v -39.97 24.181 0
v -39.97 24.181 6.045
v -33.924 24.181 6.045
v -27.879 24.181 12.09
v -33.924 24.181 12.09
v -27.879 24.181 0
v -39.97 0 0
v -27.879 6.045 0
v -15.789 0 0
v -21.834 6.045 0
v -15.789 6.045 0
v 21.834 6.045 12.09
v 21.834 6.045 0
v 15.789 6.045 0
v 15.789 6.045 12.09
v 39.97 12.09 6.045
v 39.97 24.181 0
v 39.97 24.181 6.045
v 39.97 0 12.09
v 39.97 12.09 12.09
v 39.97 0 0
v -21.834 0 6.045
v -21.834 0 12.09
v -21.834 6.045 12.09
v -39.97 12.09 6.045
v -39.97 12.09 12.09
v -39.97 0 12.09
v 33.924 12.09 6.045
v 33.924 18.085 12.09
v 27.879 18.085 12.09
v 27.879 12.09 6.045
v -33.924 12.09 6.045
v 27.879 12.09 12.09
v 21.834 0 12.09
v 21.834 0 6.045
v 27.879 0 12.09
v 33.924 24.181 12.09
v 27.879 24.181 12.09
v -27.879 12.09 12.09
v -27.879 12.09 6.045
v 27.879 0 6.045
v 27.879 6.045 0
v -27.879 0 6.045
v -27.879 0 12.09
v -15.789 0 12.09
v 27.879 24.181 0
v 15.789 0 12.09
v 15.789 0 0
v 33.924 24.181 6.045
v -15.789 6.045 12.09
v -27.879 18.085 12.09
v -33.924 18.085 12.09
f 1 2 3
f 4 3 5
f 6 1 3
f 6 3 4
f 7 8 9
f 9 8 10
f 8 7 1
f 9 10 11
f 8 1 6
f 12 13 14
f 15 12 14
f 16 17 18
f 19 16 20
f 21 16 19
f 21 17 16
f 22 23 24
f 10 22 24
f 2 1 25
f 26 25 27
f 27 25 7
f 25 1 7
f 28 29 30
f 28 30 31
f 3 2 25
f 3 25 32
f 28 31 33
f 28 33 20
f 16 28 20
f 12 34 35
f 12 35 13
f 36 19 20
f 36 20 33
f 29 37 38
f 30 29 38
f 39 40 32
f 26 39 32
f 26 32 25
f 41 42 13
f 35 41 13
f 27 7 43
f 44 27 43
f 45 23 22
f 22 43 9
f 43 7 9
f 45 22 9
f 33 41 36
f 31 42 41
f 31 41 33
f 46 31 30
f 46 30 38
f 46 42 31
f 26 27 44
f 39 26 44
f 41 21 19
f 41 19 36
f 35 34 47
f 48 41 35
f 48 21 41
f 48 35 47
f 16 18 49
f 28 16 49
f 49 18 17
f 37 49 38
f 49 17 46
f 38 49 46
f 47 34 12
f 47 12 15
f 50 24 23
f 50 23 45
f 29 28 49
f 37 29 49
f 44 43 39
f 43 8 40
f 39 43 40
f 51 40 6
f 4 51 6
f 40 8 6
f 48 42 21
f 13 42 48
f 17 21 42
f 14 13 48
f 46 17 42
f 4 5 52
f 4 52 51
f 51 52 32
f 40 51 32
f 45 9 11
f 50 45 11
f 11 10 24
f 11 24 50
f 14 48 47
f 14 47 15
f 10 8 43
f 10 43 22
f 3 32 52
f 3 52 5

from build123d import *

# Parameters (mm, degrees)
F1_DEPTH  = 12.0904
F2_DEPTH  = 6.0452
F0_W      = 6.0452
F0_H      = 6.0452
F3_DEPTH  = 12.0904
F4_DEPTH  = 12.0904
F5_DEPTH  = 6.0452
F6_SIZE   = 6.04519
F7_DEPTH  = 12.0904
F8_DEPTH  = 12.0904
F11_DEPTH = 6.0452


# Not quite as in the source:
# - a fillet or chamfer is up to 0.001 mm smaller than in the source, because OpenCascade refuses the exact size


with BuildPart() as f1:
    # F0 (on Top) → F1 (new body)
    with BuildSketch(Plane.XY):
        Polygon((-39.9695653213, 0), (-27.8791653213, 0), (-27.8791653213, 6.0452), (-27.8791653213, 12.0904), (-33.9243653213, 12.0904), (-39.9695653213, 12.0904), align=None)
    extrude(amount=F1_DEPTH)

    # F0 (on Top) → F2 (join)
    with BuildSketch(Plane.XY):
        Polygon((-39.9695653213, 24.1808), (-39.9695653213, 12.0904), (-33.9243653213, 12.0904), (-33.9243653213, 18.1356), (-33.9243653213, 24.1808), align=None)
    extrude(amount=F2_DEPTH)

    # F0 (on Top) → F3 (join)
    with BuildSketch(Plane.XY):
        with Locations((-30.9017653213, 21.1582)):
            Rectangle(F0_W, F0_H)
    extrude(amount=F3_DEPTH)



with BuildPart() as f4:
    # F0 (on Top) → F4 (new body)
    with BuildSketch(Plane.XY):
        with Locations((-18.8113653213, 3.0226)):
            Rectangle(F0_W, F0_H)
    extrude(amount=F4_DEPTH)


with BuildPart() as f1_1:
    add(f1.part)

    add(f4.part)  # F5 merges F4
    # F0 (on Top) → F5 (join)
    with BuildSketch(Plane.XY):
        with Locations((-24.8565653213, 3.0226)):
            Rectangle(F0_W, F0_H)
    extrude(amount=F5_DEPTH)

    # F6 (size 6.0452 in the source; OpenCascade refuses exactly that, so slightly less here)
    f6_edges = [f1_1.edges().sort_by_distance(p)[0] for p in [
        (-24.856565, 6.0452, 6.0452),
    ]]
    chamfer(f6_edges, length=F6_SIZE)

    # F0 (on Top) → F7 (join)
    with BuildSketch(Plane.XY):
        with Locations((-18.8113653213, 3.0226)):
            Rectangle(F0_W, F0_H)
    extrude(amount=F7_DEPTH)

    # F0 (on Top) → F8 (join)
    with BuildSketch(Plane.XY):
        with Locations((-30.9017653213, 15.113)):
            Rectangle(F0_W, F0_H)
    extrude(amount=F8_DEPTH)

    # F10 (on face) → F11 (cut, through all)
    with BuildSketch(Plane(origin=(-33.9243653213, 0, 0), x_dir=(0, -1, 0), z_dir=(-1, 0, 0))):
        Polygon((-12.0904, 12.0904), (-18.0848, 12.0904), (-12.0904, 6.0452), align=None)
    extrude(amount=-F11_DEPTH, mode=Mode.SUBTRACT)


with BuildPart() as f12_1:
    # F12: instance of F1
    add(f1_1.part.mirror(Plane.YZ))


solid = Compound([f1_1.part, f12_1.part])
